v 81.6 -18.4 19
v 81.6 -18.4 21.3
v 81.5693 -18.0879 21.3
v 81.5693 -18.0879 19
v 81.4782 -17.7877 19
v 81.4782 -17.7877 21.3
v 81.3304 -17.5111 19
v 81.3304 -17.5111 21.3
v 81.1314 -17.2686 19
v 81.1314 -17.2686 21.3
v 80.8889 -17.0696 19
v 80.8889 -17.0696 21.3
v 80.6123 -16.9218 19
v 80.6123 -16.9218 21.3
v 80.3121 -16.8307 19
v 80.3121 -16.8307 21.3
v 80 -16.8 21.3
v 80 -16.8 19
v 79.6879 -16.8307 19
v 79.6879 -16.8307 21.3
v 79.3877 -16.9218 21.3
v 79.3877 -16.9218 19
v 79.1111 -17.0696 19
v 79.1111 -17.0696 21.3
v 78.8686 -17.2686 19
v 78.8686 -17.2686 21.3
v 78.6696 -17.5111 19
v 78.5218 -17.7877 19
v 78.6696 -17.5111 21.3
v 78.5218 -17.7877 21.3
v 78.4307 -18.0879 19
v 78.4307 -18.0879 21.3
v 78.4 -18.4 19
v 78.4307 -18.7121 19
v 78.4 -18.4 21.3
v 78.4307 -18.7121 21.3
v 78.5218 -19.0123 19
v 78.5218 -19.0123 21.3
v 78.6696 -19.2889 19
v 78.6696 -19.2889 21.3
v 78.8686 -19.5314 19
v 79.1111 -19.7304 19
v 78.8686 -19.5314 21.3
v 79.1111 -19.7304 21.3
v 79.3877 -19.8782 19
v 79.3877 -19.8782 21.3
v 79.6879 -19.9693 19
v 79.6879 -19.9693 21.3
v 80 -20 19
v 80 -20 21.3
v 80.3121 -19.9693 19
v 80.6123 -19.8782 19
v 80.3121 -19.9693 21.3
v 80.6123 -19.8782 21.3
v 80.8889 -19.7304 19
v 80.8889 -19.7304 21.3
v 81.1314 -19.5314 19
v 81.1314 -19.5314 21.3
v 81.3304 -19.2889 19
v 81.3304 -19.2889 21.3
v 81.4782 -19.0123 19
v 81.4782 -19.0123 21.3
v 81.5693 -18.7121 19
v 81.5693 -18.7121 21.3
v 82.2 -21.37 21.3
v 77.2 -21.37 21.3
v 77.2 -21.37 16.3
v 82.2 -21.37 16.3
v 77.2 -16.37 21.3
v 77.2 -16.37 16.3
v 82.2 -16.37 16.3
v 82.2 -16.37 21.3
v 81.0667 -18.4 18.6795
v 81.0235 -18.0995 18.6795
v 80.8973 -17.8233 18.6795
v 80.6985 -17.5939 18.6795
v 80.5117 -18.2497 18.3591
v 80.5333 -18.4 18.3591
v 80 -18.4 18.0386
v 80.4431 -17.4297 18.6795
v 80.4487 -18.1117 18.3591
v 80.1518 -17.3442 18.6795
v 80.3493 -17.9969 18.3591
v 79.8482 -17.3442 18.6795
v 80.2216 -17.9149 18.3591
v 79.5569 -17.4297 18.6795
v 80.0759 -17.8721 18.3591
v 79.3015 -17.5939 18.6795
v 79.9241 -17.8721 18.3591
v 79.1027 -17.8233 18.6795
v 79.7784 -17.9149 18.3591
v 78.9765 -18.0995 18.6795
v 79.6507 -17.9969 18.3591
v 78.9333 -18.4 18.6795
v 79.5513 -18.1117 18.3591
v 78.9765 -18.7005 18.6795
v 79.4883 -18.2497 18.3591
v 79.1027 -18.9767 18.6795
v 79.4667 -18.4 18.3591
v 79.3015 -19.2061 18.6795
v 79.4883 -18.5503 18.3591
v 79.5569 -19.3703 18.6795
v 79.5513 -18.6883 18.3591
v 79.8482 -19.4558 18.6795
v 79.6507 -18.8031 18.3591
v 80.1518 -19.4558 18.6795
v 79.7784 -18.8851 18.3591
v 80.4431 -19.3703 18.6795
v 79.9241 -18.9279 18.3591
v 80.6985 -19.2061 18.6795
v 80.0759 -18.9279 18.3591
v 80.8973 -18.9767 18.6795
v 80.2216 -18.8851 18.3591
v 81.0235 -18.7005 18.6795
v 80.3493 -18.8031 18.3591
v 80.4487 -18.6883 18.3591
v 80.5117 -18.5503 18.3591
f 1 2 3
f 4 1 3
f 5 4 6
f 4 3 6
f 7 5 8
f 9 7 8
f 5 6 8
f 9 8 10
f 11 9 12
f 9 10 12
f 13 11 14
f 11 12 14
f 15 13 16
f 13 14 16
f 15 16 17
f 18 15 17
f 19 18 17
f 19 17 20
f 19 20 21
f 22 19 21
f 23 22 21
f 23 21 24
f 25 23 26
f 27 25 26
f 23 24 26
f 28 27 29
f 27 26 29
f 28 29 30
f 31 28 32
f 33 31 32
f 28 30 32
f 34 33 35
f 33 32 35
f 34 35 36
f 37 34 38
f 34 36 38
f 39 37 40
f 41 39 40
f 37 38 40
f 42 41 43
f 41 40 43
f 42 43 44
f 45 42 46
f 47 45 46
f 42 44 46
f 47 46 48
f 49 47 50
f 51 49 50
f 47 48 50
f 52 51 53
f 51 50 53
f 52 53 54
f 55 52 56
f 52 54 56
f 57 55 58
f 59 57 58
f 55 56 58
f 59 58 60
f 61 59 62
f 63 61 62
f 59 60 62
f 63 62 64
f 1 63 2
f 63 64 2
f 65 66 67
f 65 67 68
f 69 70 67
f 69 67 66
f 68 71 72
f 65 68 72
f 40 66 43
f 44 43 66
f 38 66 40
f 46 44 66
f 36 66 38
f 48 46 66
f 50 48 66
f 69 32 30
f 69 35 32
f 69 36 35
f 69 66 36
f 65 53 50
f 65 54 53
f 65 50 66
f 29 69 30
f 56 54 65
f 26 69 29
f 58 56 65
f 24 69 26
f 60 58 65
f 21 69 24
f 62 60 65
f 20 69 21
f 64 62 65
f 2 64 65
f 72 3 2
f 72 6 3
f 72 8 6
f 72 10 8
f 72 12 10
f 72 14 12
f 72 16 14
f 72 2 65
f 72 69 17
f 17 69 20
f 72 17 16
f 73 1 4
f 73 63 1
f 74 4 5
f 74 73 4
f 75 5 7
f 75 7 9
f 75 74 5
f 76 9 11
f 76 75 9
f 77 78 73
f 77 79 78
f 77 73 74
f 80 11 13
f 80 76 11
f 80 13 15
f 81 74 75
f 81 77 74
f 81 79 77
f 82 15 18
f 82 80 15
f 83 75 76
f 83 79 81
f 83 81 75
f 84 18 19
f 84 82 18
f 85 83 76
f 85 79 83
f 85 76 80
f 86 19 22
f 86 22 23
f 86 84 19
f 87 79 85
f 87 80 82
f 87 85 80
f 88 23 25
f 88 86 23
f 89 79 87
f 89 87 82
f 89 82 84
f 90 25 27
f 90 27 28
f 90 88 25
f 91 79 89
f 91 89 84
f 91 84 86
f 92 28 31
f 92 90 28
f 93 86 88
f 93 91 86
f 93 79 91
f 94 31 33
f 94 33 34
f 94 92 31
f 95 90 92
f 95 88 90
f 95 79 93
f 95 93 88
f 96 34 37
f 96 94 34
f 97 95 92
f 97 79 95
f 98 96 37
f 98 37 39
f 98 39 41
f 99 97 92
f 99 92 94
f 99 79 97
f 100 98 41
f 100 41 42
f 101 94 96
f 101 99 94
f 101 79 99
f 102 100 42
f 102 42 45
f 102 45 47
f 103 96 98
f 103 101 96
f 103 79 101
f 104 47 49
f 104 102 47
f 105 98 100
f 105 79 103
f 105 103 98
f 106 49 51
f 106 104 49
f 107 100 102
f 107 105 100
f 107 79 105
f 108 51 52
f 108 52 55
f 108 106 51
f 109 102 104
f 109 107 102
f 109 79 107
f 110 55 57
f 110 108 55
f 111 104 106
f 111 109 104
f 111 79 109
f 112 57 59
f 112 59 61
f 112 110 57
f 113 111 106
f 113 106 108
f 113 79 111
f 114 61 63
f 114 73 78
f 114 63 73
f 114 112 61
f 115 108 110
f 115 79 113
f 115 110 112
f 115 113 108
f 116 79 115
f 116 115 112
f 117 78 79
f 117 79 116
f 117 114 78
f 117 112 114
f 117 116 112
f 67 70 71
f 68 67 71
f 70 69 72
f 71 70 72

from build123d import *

# Parameters (mm, degrees)
SKETCH101_W      = 5
SKETCH101_H      = 5
EXTRUDE036_DEPTH = 5
SKETCH102_R      = 1.6
HOLE022_DEPTH    = 2.3
HOLE022_TIPS_R   = 1.6


with BuildPart() as part:
    # Sketch101 (on Face9 of Pocket017) → Extrude036 (new body)
    with BuildSketch(Plane.XZ.offset(16.37)):
        with Locations((79.700001, 18.8)):
            Rectangle(SKETCH101_W, SKETCH101_H)
    extrude(amount=EXTRUDE036_DEPTH)

    # Sketch102 (on Face1 of Extrude036) → Hole022 (cut)
    with BuildSketch(Plane.XY.offset(21.3)):
        with Locations((80.000001, -18.4)):
            Circle(SKETCH102_R)
    extrude(amount=-HOLE022_DEPTH, mode=Mode.SUBTRACT)

    # Hole022 tips → Hole022 tip 1 section 0
    with BuildSketch(Plane.XY.offset(19), mode=Mode.PRIVATE) as hole022_tip_1_s0:
        with Locations((80.000001, -18.4)):
            Circle(HOLE022_TIPS_R)
    loft([hole022_tip_1_s0.sketch, Vertex(80.000001, -18.4, 18.038623)], mode=Mode.SUBTRACT)


solid = part.part
